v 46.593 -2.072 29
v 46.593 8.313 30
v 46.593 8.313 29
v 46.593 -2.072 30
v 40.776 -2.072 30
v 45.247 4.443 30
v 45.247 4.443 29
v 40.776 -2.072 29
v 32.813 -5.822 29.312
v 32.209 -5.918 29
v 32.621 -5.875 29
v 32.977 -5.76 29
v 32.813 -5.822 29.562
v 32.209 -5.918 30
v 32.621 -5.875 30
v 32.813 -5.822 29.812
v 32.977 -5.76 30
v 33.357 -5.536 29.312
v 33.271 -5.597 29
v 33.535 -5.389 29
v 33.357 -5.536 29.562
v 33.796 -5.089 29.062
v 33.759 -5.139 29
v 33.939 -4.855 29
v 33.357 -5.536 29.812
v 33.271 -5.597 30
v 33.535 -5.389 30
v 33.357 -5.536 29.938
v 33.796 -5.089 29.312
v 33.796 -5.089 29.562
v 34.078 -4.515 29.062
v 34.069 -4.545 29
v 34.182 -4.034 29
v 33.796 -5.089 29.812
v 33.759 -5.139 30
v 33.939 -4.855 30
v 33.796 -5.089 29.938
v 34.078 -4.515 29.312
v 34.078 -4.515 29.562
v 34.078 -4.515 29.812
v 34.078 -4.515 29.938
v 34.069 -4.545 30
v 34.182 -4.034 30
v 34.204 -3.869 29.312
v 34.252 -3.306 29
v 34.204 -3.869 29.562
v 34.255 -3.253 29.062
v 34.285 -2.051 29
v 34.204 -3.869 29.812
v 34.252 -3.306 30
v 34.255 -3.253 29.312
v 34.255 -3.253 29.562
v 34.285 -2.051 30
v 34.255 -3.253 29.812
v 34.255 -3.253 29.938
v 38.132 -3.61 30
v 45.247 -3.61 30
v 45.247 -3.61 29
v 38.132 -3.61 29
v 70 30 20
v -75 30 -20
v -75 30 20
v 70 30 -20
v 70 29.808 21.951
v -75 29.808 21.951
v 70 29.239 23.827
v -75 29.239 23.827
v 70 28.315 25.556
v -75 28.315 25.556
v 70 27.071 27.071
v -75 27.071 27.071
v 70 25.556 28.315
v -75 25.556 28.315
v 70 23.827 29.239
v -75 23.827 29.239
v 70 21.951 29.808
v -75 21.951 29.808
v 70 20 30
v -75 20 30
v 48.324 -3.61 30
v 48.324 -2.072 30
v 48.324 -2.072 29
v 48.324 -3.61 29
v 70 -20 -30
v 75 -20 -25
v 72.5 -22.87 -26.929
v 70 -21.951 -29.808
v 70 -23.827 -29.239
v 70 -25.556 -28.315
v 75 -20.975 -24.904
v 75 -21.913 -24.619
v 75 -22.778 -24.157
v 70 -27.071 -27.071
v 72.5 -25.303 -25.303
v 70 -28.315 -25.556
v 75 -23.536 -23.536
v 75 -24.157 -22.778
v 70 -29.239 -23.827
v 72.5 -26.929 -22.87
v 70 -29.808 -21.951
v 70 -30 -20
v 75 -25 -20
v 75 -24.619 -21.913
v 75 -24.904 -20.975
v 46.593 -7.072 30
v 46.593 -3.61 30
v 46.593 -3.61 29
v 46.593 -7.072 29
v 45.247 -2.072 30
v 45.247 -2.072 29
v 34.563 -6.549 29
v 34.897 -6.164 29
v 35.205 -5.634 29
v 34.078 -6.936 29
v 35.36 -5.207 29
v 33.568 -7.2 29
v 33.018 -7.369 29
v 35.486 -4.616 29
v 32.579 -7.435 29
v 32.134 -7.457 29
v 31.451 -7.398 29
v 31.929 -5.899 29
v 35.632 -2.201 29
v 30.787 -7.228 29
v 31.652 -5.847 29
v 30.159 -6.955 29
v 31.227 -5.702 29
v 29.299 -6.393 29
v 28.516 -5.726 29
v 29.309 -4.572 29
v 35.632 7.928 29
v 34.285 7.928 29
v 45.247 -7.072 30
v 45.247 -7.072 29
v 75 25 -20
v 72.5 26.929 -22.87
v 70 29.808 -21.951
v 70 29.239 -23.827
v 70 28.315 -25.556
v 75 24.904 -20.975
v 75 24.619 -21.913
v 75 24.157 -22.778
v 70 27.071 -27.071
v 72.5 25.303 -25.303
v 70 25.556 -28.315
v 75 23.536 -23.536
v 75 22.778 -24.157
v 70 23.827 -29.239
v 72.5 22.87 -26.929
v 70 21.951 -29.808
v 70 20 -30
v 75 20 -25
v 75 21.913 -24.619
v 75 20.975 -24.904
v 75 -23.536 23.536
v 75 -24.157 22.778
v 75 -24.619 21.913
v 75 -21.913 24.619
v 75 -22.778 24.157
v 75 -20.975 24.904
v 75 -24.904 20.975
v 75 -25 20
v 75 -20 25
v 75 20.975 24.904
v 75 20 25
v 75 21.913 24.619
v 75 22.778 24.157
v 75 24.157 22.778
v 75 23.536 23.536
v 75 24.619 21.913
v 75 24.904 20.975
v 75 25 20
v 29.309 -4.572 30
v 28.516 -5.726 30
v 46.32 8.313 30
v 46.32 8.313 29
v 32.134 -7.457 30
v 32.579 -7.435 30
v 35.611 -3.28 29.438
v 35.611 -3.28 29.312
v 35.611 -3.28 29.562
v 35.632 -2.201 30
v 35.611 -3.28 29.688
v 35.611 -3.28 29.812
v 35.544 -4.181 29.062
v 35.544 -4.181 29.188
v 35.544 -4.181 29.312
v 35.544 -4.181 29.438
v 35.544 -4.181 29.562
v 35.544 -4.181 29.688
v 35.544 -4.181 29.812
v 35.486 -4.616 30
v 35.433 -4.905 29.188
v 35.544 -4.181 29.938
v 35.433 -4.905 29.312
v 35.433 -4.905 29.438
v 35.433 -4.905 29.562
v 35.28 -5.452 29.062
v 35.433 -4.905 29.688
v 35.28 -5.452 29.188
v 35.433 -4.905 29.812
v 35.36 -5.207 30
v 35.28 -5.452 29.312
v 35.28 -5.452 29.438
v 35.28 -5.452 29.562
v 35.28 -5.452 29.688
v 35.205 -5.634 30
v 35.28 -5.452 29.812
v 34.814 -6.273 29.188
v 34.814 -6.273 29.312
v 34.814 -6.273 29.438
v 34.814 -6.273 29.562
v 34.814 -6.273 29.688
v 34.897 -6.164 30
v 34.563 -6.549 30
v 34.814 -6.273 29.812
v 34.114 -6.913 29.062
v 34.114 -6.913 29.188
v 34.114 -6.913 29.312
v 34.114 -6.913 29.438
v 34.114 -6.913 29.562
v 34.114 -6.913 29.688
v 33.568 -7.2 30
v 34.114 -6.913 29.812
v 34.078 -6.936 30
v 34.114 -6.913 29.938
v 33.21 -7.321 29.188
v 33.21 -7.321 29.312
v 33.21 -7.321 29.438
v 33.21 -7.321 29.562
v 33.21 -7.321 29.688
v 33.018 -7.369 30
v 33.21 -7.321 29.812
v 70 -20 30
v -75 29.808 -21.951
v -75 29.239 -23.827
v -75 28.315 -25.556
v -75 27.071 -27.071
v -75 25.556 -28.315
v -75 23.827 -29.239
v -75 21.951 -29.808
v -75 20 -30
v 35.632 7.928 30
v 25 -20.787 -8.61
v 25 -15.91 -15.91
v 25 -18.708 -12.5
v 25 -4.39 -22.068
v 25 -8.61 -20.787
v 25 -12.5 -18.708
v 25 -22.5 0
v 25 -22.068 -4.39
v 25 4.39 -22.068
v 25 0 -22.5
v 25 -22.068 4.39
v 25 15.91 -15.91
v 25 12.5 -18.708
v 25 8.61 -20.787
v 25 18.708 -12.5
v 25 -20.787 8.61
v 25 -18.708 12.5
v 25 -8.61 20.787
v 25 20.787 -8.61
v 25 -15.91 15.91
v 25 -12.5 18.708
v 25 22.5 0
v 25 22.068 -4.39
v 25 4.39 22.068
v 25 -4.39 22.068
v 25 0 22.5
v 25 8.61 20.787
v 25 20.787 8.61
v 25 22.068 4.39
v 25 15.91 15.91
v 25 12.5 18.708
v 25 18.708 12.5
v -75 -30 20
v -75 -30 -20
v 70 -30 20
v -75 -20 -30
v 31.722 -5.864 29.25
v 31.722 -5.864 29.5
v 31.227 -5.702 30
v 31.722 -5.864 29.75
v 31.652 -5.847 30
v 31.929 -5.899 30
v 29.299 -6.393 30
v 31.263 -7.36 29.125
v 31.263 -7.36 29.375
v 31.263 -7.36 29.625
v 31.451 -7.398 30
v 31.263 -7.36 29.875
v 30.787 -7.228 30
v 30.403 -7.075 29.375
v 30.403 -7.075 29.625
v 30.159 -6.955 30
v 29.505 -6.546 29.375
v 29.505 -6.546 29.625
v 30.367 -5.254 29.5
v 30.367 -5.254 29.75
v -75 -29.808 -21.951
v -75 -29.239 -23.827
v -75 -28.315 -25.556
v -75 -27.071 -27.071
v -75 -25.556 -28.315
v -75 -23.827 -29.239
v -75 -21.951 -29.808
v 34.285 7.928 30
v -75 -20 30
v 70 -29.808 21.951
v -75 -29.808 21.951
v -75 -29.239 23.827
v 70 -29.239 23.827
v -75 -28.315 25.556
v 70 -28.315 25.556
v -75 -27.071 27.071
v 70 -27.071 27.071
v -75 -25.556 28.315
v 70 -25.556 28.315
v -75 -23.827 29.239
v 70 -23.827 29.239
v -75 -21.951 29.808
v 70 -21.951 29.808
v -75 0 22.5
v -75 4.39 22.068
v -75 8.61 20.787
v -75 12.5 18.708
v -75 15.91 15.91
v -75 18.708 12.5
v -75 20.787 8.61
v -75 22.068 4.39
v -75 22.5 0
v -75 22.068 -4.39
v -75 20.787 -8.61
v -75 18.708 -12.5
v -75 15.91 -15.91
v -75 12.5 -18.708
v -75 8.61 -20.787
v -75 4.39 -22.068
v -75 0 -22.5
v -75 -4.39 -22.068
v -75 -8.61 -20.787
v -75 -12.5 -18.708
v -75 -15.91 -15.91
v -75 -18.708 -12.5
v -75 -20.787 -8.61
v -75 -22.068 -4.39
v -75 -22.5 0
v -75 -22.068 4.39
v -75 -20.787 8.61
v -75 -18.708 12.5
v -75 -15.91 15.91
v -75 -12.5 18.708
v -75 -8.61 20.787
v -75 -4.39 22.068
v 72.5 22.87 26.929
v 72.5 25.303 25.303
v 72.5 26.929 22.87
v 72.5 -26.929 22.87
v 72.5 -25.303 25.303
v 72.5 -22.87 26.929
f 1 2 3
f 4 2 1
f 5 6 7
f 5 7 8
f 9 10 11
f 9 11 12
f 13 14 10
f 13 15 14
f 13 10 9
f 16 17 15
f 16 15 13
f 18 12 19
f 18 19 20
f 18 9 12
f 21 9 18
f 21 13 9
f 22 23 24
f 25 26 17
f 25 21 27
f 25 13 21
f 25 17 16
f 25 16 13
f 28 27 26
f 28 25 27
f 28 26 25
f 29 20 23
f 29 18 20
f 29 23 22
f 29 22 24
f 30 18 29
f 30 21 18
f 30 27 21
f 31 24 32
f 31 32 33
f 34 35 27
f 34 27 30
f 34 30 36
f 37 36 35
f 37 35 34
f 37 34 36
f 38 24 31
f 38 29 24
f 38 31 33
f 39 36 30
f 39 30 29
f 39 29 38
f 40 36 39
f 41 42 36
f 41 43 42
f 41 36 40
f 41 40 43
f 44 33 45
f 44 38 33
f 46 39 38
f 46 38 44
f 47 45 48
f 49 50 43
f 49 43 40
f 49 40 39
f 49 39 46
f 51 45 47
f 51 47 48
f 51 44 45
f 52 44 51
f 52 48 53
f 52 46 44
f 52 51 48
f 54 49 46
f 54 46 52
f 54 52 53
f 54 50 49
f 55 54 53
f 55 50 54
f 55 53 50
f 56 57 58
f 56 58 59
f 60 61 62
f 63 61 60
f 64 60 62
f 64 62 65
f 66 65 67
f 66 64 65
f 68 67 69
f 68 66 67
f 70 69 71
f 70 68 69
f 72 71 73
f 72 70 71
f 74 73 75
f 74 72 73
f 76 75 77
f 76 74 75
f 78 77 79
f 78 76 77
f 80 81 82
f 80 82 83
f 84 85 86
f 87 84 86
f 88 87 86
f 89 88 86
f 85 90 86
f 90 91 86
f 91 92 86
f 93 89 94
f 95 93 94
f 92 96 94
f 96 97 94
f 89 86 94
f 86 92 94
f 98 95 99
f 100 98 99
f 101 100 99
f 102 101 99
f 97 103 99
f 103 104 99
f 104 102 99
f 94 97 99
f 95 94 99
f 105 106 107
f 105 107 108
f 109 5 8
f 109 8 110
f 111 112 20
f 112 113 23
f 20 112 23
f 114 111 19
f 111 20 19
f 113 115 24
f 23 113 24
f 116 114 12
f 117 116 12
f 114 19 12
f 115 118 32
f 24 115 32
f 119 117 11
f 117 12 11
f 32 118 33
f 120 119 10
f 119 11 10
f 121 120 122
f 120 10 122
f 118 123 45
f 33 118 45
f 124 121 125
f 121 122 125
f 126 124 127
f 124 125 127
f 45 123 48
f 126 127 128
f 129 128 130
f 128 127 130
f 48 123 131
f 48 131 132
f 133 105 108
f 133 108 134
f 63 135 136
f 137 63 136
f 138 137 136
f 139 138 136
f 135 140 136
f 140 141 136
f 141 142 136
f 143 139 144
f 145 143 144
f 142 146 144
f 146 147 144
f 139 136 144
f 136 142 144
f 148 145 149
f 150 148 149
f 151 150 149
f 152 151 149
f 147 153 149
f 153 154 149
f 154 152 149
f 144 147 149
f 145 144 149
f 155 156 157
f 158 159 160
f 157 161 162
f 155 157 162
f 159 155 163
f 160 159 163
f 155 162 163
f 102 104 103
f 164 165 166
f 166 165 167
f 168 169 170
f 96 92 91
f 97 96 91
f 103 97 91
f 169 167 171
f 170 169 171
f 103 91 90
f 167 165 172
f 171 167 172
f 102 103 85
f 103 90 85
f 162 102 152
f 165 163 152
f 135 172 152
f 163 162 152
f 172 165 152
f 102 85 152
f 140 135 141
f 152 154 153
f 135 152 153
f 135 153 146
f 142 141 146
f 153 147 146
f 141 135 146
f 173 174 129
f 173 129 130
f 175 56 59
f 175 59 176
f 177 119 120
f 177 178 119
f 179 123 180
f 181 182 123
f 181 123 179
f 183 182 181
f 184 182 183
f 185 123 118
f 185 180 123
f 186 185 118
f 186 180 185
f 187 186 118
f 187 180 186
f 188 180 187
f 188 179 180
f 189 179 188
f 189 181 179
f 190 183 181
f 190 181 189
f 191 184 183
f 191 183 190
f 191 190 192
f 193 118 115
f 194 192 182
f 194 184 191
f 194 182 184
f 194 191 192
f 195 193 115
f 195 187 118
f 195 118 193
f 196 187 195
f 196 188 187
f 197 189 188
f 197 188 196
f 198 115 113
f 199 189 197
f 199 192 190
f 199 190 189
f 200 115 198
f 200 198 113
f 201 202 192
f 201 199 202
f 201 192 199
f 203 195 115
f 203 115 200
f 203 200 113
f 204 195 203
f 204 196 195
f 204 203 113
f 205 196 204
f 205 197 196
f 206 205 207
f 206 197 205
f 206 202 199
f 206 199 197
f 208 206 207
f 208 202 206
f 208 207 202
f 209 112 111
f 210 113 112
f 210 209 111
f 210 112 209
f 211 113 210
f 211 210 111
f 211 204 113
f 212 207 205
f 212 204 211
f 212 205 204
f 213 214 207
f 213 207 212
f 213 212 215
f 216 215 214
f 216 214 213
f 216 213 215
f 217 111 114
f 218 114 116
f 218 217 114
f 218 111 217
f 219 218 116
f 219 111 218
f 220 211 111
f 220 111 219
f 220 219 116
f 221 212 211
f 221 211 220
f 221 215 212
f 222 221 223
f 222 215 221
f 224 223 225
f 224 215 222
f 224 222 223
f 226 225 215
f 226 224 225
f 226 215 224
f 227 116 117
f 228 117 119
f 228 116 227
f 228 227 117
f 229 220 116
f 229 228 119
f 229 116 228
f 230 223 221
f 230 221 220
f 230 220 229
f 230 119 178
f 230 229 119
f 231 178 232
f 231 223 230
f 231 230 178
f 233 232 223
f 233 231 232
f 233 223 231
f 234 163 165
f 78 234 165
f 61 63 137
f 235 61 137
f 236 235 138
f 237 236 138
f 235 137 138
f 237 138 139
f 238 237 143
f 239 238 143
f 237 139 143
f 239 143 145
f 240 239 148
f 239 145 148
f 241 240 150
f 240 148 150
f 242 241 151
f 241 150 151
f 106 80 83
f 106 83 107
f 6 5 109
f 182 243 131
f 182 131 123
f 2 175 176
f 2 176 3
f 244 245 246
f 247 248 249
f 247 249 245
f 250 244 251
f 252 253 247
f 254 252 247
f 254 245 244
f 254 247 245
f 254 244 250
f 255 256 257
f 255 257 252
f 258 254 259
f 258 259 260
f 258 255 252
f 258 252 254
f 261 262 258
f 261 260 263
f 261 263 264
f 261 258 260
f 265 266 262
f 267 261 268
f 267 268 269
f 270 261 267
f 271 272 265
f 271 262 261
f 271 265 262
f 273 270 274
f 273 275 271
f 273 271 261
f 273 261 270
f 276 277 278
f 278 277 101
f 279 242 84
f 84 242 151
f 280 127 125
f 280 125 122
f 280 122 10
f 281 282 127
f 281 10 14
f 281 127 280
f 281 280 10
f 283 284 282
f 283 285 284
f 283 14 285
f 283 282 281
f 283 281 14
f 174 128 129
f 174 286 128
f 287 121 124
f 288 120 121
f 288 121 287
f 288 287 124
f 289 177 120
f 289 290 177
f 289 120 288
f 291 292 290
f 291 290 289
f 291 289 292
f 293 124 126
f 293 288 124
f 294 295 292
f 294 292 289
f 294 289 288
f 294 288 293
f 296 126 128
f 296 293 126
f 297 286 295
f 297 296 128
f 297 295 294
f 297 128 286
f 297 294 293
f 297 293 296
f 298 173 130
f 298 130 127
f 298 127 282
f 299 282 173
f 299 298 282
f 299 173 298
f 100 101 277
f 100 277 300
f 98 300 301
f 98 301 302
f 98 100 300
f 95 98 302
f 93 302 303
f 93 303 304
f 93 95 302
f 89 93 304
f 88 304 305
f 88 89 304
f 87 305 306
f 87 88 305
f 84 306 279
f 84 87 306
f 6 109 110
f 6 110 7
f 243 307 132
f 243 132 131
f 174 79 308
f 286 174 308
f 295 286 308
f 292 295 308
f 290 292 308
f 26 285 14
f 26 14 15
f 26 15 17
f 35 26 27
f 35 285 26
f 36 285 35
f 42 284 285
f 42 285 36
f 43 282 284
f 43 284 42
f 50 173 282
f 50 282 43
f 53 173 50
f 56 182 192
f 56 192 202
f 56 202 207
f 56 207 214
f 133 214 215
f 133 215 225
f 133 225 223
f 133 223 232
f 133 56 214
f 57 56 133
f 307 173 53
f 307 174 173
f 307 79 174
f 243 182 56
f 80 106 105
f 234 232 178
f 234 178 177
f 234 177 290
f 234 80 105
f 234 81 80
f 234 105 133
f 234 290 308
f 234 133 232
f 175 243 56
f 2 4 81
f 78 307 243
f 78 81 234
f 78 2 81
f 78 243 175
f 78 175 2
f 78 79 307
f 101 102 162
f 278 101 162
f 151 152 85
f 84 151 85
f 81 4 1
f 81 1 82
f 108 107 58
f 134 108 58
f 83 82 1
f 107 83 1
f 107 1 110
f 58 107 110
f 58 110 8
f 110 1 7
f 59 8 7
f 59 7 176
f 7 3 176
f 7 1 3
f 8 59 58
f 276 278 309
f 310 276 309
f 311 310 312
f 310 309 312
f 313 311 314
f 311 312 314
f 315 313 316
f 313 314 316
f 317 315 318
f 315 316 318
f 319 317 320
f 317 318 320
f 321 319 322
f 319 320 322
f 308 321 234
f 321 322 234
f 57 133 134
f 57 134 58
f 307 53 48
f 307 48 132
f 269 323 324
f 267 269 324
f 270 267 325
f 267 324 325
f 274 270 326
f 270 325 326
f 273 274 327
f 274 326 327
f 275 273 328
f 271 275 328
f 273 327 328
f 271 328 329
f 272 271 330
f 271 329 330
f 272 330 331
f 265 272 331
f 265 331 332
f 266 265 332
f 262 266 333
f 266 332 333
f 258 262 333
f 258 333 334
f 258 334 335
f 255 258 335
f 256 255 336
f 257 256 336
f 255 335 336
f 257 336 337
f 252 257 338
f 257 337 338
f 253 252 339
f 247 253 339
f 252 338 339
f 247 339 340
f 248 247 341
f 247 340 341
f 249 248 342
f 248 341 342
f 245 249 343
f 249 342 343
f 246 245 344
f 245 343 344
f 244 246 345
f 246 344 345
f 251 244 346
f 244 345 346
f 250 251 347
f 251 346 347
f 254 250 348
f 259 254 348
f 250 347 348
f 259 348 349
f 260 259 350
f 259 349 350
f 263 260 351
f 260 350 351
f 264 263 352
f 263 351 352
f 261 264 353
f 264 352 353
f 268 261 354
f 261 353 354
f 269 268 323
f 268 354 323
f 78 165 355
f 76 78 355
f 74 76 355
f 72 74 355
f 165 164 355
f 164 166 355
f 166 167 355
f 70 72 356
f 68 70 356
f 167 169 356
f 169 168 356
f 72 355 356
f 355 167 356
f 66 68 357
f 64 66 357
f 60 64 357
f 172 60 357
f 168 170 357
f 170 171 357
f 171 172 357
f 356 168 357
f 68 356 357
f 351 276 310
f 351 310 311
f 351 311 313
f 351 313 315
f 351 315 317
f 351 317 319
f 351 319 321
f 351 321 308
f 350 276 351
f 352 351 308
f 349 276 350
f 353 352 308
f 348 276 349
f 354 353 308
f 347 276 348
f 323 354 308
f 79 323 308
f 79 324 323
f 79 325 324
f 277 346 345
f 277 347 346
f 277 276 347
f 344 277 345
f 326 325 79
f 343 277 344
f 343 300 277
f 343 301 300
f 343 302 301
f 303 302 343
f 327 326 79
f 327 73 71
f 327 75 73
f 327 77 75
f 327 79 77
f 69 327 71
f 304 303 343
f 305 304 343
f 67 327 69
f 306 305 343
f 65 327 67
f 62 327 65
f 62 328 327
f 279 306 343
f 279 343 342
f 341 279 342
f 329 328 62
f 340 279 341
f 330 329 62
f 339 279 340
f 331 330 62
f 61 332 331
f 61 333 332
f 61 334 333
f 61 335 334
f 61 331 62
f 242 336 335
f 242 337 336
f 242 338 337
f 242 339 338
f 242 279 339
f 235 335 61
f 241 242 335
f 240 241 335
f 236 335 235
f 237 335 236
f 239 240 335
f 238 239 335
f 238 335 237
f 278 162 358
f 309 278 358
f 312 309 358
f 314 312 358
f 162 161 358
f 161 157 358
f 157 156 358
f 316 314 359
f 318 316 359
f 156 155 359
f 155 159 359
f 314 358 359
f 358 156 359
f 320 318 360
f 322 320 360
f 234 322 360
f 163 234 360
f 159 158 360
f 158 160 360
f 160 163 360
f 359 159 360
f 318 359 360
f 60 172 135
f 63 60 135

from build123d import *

# Parameters (mm, degrees)
BOSS_EXTRUDE1_DEPTH      = 30
BOSS_EXTRUDE1_DEPTH_BACK = 30
SKETCH1_W                = 150
SKETCH1_H                = 60
FILLET1_R                = 10
CHAMFER1_SIZE            = 5
CUT_EXTRUDE1_DEPTH       = 1
SKETCH14_R               = 22.5
CUT_EXTRUDE5_DEPTH       = 100


with BuildPart() as part:
    # Sketch1 → Boss-Extrude1 (new, two sides: drawn at the far end of the back side and taken through both)
    with BuildSketch(Plane.XY.offset(-BOSS_EXTRUDE1_DEPTH_BACK)):
        Rectangle(SKETCH1_W, SKETCH1_H)
    extrude(amount=BOSS_EXTRUDE1_DEPTH + BOSS_EXTRUDE1_DEPTH_BACK)

    # Fillet1
    fillet1_edges = [part.edges().sort_by_distance(p)[0] for p in [
        (0, 30, 30),
        (0, -30, 30),
        (0, -30, -30),
        (0, 30, -30),
    ]]
    fillet(fillet1_edges, radius=FILLET1_R)

    # Chamfer1
    chamfer1_edges = [part.edges().sort_by_distance(p)[0] for p in [
        (75, -30, 0),
        (75, 30, 0),
        (75, 0, 30),
        (75, 0, -30),
        (75, 27.071067812, -27.071067812),
        (75, 27.071067812, 27.071067812),
        (75, -27.071067812, 27.071067812),
        (75, -27.071067812, -27.071067812),
    ]]
    chamfer(chamfer1_edges, length=CHAMFER1_SIZE)

    # Sketch4 → Cut-Extrude1 (cut)
    # profile 1 of 2: a face of its own
    with BuildSketch(Plane.XY.offset(30)):
        with BuildLine():
            Line((34.285450061, 7.928114282), (35.631603908, 7.928114282))
            Line((35.631603908, 7.928114282), (35.631603908, -2.201092449))
            add(Edge.make_bspline(
                [(35.631603908, -2.201092449), (35.630258542, -2.388400324), (35.627675276, -2.748054301), (35.613470659, -3.266085283), (35.587184325, -3.73910251), (35.548891415, -4.168181568), (35.497804703, -4.551978234), (35.439343154, -4.893458025), (35.368574016, -5.189770949), (35.262003446, -5.522493902), (35.087257952, -5.887395922), (34.82425636, -6.281489425), (34.497544375, -6.626204042), (34.119111376, -6.925572863), (33.685649844, -7.164103854), (33.206086048, -7.335340333), (32.683372102, -7.439786861), (32.320804049, -7.450817883), (32.134007754, -7.456501103)],
                knots=[0, 0, 0, 0, 1.237770943, 2.376671248, 3.424123796, 4.367912054, 5.222547132, 5.982086412, 6.656319012, 7.234008312, 8.288027371, 9.317870876, 10.352700517, 11.413286737, 12.494591526, 13.606319346, 14.766767577, 16, 16, 16, 16], degree=3))
            add(Edge.make_bspline(
                [(32.134007754, -7.456501103), (31.988471933, -7.451869921), (31.695644221, -7.442551676), (31.259826898, -7.366601477), (30.825247001, -7.24953272), (30.389597935, -7.078093026), (29.944272615, -6.844926175), (29.483239701, -6.53984839), (29.000568882, -6.163427562), (28.682640513, -5.876122938), (28.516219292, -5.725731872)],
                knots=[0, 0, 0, 0, 0.848567217, 1.707373443, 2.573483905, 3.470863513, 4.432650262, 5.500696352, 6.691726801, 8, 8, 8, 8], degree=3))
            Line((28.516219292, -5.725731872), (29.309488523, -4.571885718))
            add(Edge.make_bspline(
                [(29.309488523, -4.571885718), (29.492500004, -4.698088845), (29.838049545, -4.936376804), (30.34592572, -5.242919377), (30.795913519, -5.505741515), (31.090269007, -5.639679854), (31.226555831, -5.701693411)],
                knots=[0, 0, 0, 0, 1.196737151, 2.259595785, 3.194191475, 4, 4, 4, 4], degree=3))
            add(Edge.make_bspline(
                [(31.226555831, -5.701693411), (31.30920288, -5.734091085), (31.471292148, -5.797630139), (31.719113918, -5.868541131), (31.96552122, -5.907294317), (32.128882765, -5.91450003), (32.209127946, -5.918039564)],
                knots=[0, 0, 0, 0, 1.051806502, 2.062826769, 3.048436908, 4, 4, 4, 4], degree=3))
            add(Edge.make_bspline(
                [(32.209127946, -5.918039564), (32.312768468, -5.913656415), (32.517627566, -5.904992544), (32.815330398, -5.82849565), (33.100150531, -5.711733923), (33.361877636, -5.540771235), (33.603100723, -5.337493718), (33.802141404, -5.091682252), (33.968072452, -4.819256606), (34.067928281, -4.561378947), (34.131548732, -4.326193389), (34.171927133, -4.110051378), (34.207235678, -3.857359327), (34.238013757, -3.567815611), (34.256032917, -3.240840545), (34.2762498, -2.877394218), (34.283558061, -2.476560309), (34.284800151, -2.197084801), (34.285450061, -2.050852064)],
                knots=[0, 0, 0, 0, 0.997221856, 1.971139923, 2.944579524, 3.951425367, 4.971190333, 5.972282193, 6.985401279, 8.033996657, 8.624075553, 9.332086008, 10.151144245, 11.082816738, 12.137127781, 13.306538797, 14.590673636, 16, 16, 16, 16], degree=3))
            Line((34.285450061, -2.050852064), (34.285450061, 7.928114282))
        make_face()
    # profile 2 of 2: a face of its own
    with BuildSketch(Plane.XY.offset(30)):
        Polygon((46.319704869, 8.312729666), (46.593142369, 8.312729666), (46.593142369, -2.071885718), (48.3239116, -2.071885718), (48.3239116, -3.610347257), (46.593142369, -3.610347257), (46.593142369, -7.071885718), (45.246988523, -7.071885718), (45.246988523, -3.610347257), (38.131603908, -3.610347257), align=None)
        Polygon((45.246988523, -2.071885718), (45.246988523, 4.442537359), (40.775834677, -2.071885718), align=None, mode=Mode.SUBTRACT)
    extrude(amount=-CUT_EXTRUDE1_DEPTH, mode=Mode.SUBTRACT)

    # Sketch14 → Cut-Extrude5 (cut)
    with BuildSketch(Plane.ZY.offset(75)):
        Circle(SKETCH14_R)
    extrude(amount=-CUT_EXTRUDE5_DEPTH, mode=Mode.SUBTRACT)


solid = part.part
